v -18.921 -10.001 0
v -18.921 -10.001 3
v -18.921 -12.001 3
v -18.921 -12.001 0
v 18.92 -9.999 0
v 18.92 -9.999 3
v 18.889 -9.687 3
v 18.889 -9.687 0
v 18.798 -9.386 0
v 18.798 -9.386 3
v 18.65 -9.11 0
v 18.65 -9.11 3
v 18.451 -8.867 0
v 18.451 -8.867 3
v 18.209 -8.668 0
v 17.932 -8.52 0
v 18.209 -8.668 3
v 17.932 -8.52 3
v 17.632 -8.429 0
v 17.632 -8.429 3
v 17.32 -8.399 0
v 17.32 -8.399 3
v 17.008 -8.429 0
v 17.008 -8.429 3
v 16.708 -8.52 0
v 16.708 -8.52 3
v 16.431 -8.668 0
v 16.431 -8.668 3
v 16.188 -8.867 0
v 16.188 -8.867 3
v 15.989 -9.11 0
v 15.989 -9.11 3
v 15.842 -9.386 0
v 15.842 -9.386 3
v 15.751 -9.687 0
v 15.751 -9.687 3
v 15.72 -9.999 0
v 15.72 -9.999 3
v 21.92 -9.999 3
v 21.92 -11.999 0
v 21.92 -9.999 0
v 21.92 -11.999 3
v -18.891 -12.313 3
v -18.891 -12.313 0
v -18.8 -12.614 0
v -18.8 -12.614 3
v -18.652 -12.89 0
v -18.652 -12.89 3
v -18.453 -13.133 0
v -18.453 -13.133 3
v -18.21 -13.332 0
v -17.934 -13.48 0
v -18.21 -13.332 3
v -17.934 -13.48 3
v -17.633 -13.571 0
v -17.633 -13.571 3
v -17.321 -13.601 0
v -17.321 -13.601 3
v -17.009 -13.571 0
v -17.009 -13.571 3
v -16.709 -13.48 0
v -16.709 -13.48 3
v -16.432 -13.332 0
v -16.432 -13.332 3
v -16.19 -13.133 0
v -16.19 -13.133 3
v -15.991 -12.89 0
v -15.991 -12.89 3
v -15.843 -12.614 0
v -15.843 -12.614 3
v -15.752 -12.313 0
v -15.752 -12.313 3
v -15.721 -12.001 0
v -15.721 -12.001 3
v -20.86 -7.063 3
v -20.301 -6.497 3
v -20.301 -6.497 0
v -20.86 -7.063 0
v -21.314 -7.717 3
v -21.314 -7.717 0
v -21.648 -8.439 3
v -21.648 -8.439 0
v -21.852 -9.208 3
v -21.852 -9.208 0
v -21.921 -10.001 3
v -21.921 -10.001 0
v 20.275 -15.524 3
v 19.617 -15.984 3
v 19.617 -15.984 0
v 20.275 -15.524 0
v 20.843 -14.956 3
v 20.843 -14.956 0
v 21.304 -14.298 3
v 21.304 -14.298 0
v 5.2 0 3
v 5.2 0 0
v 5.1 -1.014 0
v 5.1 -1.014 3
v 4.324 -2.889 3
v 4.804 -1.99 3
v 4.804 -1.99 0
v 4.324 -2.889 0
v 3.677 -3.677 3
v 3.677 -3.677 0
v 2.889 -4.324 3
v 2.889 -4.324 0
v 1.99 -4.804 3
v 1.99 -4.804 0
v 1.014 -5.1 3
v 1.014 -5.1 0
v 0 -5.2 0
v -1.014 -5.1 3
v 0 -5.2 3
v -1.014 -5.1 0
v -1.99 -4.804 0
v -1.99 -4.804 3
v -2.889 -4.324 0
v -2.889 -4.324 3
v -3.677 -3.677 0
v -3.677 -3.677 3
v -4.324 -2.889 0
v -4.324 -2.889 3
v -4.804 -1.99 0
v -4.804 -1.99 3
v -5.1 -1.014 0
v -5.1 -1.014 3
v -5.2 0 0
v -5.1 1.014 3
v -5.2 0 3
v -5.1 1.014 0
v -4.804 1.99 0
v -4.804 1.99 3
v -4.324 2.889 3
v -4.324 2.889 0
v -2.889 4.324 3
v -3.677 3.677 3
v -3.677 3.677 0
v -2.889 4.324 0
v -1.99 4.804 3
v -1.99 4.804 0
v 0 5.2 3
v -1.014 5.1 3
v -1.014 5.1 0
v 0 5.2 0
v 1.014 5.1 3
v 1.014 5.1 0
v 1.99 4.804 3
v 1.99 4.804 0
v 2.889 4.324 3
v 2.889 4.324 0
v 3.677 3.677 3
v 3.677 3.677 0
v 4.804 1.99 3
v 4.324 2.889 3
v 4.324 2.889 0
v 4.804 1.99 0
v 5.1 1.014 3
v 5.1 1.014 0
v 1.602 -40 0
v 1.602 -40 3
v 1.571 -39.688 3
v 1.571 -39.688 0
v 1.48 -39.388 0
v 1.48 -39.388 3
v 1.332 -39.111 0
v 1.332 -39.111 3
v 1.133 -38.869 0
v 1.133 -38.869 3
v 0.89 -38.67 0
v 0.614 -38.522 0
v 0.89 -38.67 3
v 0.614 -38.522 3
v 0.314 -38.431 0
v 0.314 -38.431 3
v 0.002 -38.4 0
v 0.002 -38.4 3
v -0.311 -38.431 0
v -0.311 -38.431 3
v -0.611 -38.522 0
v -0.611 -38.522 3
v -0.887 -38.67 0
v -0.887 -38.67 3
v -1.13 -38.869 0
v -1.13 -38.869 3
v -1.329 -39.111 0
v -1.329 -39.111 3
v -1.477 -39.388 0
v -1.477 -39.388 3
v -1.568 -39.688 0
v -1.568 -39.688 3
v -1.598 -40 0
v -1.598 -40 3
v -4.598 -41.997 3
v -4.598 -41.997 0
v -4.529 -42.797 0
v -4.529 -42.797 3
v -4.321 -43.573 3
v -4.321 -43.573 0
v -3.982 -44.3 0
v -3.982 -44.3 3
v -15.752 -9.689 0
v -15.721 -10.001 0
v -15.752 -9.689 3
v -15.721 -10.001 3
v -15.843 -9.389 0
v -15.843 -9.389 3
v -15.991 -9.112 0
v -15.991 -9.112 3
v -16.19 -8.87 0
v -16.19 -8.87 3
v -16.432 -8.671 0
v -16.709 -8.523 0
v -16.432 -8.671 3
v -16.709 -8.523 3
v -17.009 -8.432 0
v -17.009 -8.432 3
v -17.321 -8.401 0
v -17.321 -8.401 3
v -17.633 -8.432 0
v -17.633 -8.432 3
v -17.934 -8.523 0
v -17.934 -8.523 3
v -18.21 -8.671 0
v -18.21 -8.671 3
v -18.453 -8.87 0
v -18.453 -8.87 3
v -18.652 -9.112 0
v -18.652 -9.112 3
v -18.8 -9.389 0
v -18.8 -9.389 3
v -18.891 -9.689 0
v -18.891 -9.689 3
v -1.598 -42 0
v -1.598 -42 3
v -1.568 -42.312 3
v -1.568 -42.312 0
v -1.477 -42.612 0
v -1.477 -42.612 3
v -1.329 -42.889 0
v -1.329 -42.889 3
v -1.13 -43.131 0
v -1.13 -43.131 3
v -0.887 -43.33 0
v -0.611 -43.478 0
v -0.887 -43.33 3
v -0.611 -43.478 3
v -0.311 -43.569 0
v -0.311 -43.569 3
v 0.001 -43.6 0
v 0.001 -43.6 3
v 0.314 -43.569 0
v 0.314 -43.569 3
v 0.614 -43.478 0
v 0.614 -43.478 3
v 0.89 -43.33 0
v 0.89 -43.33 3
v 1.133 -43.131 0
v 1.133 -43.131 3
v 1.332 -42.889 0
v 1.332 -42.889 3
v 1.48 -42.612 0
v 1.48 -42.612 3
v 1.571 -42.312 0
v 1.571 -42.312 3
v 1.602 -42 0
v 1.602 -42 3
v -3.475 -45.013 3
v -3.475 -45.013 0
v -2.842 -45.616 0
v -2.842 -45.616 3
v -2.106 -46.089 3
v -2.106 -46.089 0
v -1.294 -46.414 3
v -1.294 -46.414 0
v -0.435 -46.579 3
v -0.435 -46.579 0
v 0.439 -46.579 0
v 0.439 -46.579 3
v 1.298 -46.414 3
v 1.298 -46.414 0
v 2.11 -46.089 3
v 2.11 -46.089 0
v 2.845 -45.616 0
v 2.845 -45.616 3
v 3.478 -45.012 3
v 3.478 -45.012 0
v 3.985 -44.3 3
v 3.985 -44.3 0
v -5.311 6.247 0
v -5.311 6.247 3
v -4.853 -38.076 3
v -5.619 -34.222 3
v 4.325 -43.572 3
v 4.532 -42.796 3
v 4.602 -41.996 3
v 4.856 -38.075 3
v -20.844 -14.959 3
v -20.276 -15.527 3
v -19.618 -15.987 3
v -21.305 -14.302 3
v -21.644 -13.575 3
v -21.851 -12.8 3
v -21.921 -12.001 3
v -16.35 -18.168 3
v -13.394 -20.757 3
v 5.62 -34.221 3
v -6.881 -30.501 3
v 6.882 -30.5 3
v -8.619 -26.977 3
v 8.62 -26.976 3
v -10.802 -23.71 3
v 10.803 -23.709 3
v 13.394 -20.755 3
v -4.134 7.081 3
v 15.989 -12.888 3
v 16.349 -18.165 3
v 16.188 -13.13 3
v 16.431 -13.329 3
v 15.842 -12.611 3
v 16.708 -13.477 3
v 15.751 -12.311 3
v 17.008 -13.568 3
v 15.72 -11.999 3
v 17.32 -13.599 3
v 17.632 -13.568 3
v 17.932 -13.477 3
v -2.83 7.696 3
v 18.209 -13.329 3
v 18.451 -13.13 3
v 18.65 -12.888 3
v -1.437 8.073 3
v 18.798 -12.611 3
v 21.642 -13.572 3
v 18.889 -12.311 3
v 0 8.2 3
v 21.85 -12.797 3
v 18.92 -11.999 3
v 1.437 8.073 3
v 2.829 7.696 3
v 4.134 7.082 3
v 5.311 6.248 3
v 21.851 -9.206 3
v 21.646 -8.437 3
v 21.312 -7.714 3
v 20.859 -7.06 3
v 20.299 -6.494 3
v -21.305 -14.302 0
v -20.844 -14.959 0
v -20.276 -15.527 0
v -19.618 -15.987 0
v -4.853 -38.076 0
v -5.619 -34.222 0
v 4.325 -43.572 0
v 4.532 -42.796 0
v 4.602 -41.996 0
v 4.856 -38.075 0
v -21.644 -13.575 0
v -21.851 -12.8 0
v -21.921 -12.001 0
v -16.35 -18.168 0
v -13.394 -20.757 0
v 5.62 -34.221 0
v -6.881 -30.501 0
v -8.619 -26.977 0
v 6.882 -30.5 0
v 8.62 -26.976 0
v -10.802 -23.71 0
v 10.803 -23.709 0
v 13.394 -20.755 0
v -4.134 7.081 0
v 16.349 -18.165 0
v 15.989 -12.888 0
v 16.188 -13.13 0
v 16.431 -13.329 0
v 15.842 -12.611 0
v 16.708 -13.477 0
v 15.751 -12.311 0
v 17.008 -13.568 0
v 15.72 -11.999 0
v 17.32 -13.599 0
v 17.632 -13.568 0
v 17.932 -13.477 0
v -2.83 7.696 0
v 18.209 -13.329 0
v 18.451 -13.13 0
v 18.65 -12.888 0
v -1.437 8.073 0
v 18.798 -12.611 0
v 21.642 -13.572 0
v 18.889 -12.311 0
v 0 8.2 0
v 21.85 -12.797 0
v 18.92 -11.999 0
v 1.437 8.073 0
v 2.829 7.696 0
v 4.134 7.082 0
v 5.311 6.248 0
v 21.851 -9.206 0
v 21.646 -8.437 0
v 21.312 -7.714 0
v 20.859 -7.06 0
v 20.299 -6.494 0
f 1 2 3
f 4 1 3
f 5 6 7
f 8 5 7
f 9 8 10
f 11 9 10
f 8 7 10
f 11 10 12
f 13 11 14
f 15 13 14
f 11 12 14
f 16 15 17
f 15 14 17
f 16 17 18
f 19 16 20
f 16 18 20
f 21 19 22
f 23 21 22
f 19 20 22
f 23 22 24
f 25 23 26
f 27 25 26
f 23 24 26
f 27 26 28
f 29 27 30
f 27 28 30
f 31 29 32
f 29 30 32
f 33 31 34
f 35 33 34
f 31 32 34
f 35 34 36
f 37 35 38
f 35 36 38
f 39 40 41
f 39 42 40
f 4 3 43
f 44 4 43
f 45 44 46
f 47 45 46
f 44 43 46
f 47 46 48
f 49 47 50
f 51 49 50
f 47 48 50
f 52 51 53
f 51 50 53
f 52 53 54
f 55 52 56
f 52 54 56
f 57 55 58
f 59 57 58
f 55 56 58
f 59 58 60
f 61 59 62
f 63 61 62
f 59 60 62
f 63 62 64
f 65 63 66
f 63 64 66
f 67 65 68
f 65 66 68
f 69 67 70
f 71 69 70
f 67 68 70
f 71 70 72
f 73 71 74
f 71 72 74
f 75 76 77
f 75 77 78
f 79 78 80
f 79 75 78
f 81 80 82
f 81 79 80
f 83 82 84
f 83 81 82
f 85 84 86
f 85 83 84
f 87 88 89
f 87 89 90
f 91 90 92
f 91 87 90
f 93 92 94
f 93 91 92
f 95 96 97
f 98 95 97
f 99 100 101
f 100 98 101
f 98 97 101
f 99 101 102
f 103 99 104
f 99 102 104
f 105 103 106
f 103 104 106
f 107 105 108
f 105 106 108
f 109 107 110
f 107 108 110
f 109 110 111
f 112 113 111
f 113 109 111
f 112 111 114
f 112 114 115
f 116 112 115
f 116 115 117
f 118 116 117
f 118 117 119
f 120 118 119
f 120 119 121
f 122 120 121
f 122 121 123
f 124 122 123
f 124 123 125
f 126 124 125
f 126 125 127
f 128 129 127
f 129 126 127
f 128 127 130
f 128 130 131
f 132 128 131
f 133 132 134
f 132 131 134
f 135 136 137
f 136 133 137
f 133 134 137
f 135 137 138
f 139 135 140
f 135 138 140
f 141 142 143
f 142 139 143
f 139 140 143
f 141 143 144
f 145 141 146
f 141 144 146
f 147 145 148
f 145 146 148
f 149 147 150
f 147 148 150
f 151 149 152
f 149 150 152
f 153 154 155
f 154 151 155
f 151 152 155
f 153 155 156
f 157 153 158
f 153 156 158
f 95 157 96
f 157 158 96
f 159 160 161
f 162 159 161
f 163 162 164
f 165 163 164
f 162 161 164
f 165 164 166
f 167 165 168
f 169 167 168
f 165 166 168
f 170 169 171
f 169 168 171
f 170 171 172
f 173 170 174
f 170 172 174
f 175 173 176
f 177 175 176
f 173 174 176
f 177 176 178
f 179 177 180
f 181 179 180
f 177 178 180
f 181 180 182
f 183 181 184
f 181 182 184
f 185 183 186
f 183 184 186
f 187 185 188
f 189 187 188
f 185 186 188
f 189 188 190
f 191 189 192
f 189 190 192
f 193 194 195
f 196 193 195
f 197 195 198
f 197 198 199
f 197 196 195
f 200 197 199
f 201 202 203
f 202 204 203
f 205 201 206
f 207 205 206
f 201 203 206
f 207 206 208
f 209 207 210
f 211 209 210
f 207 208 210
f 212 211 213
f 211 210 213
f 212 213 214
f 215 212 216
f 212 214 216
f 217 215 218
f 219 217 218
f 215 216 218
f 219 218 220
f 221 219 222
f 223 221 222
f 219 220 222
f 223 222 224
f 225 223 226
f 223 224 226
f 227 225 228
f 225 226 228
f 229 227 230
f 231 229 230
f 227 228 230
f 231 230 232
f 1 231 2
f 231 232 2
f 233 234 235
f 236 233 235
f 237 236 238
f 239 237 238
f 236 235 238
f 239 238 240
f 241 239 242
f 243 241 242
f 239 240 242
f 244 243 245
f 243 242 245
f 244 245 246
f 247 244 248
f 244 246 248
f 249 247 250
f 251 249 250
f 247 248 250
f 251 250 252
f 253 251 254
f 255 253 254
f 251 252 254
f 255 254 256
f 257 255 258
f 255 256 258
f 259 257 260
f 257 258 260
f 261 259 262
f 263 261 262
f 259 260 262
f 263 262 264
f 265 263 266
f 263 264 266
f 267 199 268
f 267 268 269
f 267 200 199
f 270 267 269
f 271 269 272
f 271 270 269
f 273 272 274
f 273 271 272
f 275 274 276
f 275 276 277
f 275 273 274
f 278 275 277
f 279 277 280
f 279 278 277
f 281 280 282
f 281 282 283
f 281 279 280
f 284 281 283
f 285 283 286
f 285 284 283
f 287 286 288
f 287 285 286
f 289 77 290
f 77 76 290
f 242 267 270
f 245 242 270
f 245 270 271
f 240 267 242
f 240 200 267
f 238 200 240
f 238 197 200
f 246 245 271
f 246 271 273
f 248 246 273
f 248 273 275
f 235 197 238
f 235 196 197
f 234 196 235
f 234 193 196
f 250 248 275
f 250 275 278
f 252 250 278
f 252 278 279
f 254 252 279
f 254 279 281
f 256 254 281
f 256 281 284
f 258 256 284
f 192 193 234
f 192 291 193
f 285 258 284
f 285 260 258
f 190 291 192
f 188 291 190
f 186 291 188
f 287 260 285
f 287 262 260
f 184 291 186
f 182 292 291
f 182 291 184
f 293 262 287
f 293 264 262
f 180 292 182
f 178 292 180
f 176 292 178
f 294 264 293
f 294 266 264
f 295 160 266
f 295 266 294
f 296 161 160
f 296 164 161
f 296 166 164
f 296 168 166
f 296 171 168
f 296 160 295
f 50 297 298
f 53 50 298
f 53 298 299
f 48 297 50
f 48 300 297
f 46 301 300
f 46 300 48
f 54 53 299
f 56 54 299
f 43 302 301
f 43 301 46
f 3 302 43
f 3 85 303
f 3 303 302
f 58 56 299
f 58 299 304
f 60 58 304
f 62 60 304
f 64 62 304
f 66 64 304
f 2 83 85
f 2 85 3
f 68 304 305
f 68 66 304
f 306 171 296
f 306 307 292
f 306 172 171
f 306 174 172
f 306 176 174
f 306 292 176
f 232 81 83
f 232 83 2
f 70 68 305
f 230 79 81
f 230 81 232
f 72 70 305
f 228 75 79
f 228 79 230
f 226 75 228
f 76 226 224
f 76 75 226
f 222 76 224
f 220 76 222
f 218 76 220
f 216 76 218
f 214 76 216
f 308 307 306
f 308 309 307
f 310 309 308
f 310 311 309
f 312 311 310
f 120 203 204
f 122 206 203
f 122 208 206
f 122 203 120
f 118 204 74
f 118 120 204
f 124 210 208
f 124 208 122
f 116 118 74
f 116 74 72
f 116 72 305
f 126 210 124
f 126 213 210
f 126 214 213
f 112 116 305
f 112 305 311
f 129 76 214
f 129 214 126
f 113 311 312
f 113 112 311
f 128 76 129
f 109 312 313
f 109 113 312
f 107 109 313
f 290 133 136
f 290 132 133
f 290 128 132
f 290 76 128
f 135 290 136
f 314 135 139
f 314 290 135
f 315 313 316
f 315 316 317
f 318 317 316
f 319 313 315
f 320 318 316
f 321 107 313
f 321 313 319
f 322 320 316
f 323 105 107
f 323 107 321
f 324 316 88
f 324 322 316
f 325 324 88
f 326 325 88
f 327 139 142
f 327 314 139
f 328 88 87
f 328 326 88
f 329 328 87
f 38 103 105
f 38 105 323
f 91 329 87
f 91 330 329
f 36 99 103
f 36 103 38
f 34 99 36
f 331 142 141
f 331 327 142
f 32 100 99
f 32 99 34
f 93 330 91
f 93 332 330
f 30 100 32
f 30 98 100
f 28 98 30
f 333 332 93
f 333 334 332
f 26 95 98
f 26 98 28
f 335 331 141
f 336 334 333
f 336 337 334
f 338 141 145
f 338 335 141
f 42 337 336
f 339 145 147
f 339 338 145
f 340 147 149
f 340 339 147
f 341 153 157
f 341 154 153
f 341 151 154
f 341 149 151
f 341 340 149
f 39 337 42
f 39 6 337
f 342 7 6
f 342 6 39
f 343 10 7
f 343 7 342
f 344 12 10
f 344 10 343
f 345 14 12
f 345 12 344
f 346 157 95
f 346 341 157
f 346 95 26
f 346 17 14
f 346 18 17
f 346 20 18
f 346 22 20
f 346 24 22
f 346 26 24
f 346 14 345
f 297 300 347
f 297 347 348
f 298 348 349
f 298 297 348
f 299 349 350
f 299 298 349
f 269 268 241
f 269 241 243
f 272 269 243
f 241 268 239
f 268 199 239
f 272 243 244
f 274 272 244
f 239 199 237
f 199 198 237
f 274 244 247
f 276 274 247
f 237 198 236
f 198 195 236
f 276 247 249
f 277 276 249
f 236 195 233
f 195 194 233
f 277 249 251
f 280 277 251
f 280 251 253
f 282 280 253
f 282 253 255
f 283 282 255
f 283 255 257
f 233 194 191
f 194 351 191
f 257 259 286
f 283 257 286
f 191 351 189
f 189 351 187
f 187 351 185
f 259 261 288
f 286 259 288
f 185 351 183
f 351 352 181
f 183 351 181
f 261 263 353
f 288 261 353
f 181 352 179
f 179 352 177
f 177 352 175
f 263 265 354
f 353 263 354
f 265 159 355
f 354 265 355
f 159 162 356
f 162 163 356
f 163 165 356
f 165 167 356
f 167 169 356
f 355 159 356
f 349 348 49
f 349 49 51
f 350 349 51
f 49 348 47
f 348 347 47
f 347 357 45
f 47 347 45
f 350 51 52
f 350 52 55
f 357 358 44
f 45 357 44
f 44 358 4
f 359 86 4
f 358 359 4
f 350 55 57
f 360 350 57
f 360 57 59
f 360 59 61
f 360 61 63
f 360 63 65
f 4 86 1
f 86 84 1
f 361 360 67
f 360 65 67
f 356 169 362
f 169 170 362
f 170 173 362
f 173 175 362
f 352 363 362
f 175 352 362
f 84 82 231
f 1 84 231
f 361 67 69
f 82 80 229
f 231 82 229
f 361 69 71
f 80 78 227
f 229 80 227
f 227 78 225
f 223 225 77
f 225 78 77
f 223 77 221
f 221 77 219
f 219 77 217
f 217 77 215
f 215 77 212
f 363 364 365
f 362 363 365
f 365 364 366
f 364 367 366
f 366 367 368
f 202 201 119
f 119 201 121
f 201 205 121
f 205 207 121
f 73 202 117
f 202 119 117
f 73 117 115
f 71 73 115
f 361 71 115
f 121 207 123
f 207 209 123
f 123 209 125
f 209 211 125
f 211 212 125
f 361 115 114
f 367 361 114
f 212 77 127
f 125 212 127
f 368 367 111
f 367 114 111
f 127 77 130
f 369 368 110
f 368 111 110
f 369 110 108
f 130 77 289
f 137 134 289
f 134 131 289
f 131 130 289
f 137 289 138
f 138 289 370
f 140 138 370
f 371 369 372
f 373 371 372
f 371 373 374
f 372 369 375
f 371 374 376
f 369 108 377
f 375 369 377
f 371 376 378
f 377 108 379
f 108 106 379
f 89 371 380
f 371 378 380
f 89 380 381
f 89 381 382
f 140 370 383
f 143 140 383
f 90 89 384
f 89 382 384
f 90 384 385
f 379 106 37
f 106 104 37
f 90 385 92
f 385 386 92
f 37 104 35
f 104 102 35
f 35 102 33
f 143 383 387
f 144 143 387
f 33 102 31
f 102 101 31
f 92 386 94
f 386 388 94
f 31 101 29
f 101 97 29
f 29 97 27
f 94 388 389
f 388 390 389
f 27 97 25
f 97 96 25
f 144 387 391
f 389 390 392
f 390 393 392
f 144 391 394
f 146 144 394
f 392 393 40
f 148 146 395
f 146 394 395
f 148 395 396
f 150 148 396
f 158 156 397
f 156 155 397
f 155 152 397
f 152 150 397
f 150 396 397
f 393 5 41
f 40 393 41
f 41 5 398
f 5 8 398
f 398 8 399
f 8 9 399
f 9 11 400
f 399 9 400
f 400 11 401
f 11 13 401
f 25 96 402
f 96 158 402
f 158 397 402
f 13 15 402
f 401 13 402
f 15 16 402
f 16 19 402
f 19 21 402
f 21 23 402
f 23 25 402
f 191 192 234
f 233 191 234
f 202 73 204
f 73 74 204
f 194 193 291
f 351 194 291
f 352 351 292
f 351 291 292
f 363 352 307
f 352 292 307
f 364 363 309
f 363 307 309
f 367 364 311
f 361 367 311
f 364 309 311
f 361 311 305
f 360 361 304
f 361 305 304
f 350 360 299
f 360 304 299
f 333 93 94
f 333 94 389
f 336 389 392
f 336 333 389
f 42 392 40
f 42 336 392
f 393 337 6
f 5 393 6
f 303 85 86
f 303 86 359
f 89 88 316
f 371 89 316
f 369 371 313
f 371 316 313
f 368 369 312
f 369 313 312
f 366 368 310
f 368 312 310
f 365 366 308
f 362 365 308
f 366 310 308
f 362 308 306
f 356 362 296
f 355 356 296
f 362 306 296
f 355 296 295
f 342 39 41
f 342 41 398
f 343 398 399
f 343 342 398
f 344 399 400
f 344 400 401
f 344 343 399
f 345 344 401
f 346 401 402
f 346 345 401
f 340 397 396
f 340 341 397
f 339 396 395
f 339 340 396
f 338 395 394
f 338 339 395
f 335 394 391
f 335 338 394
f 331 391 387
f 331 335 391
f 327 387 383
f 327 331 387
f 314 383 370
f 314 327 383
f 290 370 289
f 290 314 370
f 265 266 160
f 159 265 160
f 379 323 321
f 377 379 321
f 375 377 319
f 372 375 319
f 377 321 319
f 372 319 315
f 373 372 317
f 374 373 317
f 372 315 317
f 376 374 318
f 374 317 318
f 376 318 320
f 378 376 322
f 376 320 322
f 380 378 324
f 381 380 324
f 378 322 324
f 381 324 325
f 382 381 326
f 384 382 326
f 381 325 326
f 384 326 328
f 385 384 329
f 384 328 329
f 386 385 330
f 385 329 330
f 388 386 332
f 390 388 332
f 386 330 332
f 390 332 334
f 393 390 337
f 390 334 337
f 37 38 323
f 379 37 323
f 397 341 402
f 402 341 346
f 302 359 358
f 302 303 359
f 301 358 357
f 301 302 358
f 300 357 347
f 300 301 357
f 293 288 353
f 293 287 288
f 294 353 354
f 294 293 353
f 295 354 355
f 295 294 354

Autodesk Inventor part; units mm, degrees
ref_plane "YZ Plane" through (0, 0, 0) normal (1, 0, 0) x (0, 1, 0)
ref_plane "XZ Plane" through (0, 0, 0) normal (0, 1, 0) x (-1, 0, 0)
ref_plane "XY Plane" through (0, 0, 0) normal (0, 0, 1) x (1, 0, 0)
sketch "スケッチ1" plane through (0, 0, 0) normal (0, 0, 1) x (1, 0, 0)
  circle A0 centre (0, 0) radius 5.2
  line L0 (25, -50) -> (-25, -50)
  line L1 (-25, -50) -> (-25, 50)
  line L2 (-25, 50) -> (25, 50)
  line L3 (25, 50) -> (25, -50)
  line L4 (25, -50) -> (-25, 50) construction
  line L5 (-25, -50) -> (25, 50) construction
  dimension "d0" = 10.4
  dimension "d1" = 50
  dimension "d2" = 100
extrude "押し出し1" add sketch "スケッチ1" along normal blind 3
sketch "スケッチ2" plane through (0, 0, 3) normal (0, 0, 1) x (1, 0, 0)
  circle A0 centre (17.3198, -9.9987) radius 1.25 construction
  circle A1 centre (-17.3213, -10.0013) radius 1.25 construction
  circle A2 centre (0.0015, -40) radius 1.25 construction
  line L0 (-17.3213, -10.0013) -> (-17.3213, -12.0013) construction
  line L1 (-18.9213, -10.0013) -> (-18.9213, -12.0013)
  line L2 (-15.7213, -12.0013) -> (-15.7213, -10.0013)
  arc A3 (-15.7213, -10.0013) -> (-18.9213, -10.0013) centre (-17.3213, -10.0013) ccw
  arc A4 (-18.9213, -12.0013) -> (-15.7213, -12.0013) centre (-17.3213, -12.0013) ccw
  line L3 (0.0015, -40) -> (0.0015, -42) construction
  line L4 (-1.5985, -40) -> (-1.5985, -42)
  line L5 (1.6015, -42) -> (1.6015, -40)
  arc A5 (1.6015, -40) -> (-1.5985, -40) centre (0.0015, -40) ccw
  arc A6 (-1.5985, -42) -> (1.6015, -42) centre (0.0015, -42) ccw
  line L6 (17.3198, -9.9987) -> (17.3198, -11.9987) construction
  line L7 (15.7198, -9.9987) -> (15.7198, -11.9987)
  line L8 (18.9198, -11.9987) -> (18.9198, -9.9987)
  arc A7 (18.9198, -9.9987) -> (15.7198, -9.9987) centre (17.3198, -9.9987) ccw
  arc A8 (15.7198, -11.9987) -> (18.9198, -11.9987) centre (17.3198, -11.9987) ccw
  circle A9 centre (0, 0) radius 5.2 projected
  arc A10 (5.3111, 6.2476) -> (-5.3114, 6.2473) centre (0, 0) ccw
  line L9 (-12.7213, -12.0013) -> (-12.7213, -10.0013)
  arc A11 (-20.3008, -6.4967) -> (-21.9213, -10.0013) centre (-17.3213, -10.0013) ccw
  line L10 (-21.9213, -10.0013) -> (-21.9213, -12.0013)
  arc A12 (-21.9213, -12.0013) -> (-21.3048, -14.3016) centre (-17.3213, -12.0013) ccw
  line L11 (21.9198, -11.9987) -> (21.9198, -9.9987)
  arc A13 (21.9198, -9.9987) -> (20.2992, -6.494) centre (17.3198, -9.9987) ccw
  line L12 (12.7198, -9.9987) -> (12.7198, -11.9987)
  arc A14 (21.3037, -14.2984) -> (21.9198, -11.9987) centre (17.3198, -11.9987) ccw
  line L13 (4.6015, -40) -> (4.6015, -42)
  arc A15 (-3.9821, -44.3003) -> (3.9854, -44.2997) centre (0.0015, -42) ccw
  line L14 (-4.5985, -42) -> (-4.5985, -40)
  arc A16 (4.6015, -40) -> (-4.5985, -40) centre (0.0015, -40) ccw
  line L15 (-20.3008, -6.4967) -> (-5.3114, 6.2473)
  line L16 (5.3111, 6.2476) -> (20.2992, -6.494)
  line L17 (21.3037, -14.2984) -> (3.9854, -44.2997)
  line L18 (-3.9821, -44.3003) -> (-21.3048, -14.3016)
  point P0 (-17.3213, -11.0013)
  point P1 (0.0015, -41)
  point P2 (17.3198, -10.9987)
  dimension "d5" = 1.6
  dimension "d6" = 2
  dimension "d7" = 3
  dimension "d8" = 3
  dimension "d9" = 3
  dimension "d10" = 3
extrude "押し出し2" cut sketch "スケッチ2" against normal blind 3 keep common part
sketch "スケッチ3" plane through (0, 0, 3) normal (0, 0, 1) x (1, 0, 0)
  arc A0 (15.7198, -11.9987) -> (18.9198, -11.9987) centre (17.3198, -11.9987) ccw projected
  line L0 (15.7198, -9.9987) -> (15.7198, -11.9987) projected
  arc A1 (18.9198, -9.9987) -> (15.7198, -9.9987) centre (17.3198, -9.9987) ccw projected
  line L1 (18.9198, -11.9987) -> (18.9198, -9.9987) projected
  arc A2 (-1.5985, -42) -> (1.6015, -42) centre (0.0015, -42) ccw projected
  line L2 (-1.5985, -40) -> (-1.5985, -42) projected
  arc A3 (1.6015, -40) -> (-1.5985, -40) centre (0.0015, -40) ccw projected
  line L3 (1.6015, -42) -> (1.6015, -40) projected
  arc A4 (-18.9213, -12.0013) -> (-15.7213, -12.0013) centre (-17.3213, -12.0013) ccw projected
  line L4 (-18.9213, -10.0013) -> (-18.9213, -12.0013) projected
  arc A5 (-15.7213, -10.0013) -> (-18.9213, -10.0013) centre (-17.3213, -10.0013) ccw projected
  line L5 (-15.7213, -12.0013) -> (-15.7213, -10.0013) projected
  line L6 (-21.9213, -12.0013) -> (-21.9213, -10.0013) projected
  arc A6 (-21.9213, -12.0013) -> (-21.3048, -14.3016) centre (-17.3213, -12.0013) ccw projected
  line L7 (-3.9821, -44.3003) -> (-21.3048, -14.3016) projected
  arc A7 (-3.9821, -44.3003) -> (3.9854, -44.2997) centre (0.0015, -42) ccw projected
  line L8 (21.3037, -14.2984) -> (3.9854, -44.2997) projected
  arc A8 (21.3037, -14.2984) -> (21.9198, -11.9987) centre (17.3198, -11.9987) ccw projected
  line L9 (21.9198, -9.9987) -> (21.9198, -11.9987) projected
  arc A9 (21.9198, -9.9987) -> (20.2992, -6.494) centre (17.3198, -9.9987) ccw projected
  line L10 (5.3111, 6.2476) -> (20.2992, -6.494) projected
  arc A10 (5.3111, 6.2476) -> (-5.3114, 6.2473) centre (0, 0) ccw projected
  line L11 (-20.3008, -6.4967) -> (-5.3114, 6.2473) projected
  arc A11 (-20.3008, -6.4967) -> (-21.9213, -10.0013) centre (-17.3213, -10.0013) ccw projected
  circle A12 centre (0, 0) radius 5.2 projected
  arc A13 (19.6173, -15.9838) -> (4.6015, -41.9965) centre (34.6015, -41.9737) ccw
  arc A14 (19.6173, -15.9838) -> (21.3037, -14.2984) centre (17.3198, -11.9987) ccw
  arc A15 (-21.3048, -14.3016) -> (-19.6182, -15.9868) centre (-17.3213, -12.0013) ccw
  arc A16 (-4.5985, -41.9972) -> (-19.6182, -15.9868) centre (-34.5985, -41.9789) ccw
  arc A17 (-4.5985, -41.9972) -> (-3.9821, -44.3003) centre (0.0015, -42) ccw
  arc A18 (3.9854, -44.2997) -> (4.6015, -41.9965) centre (0.0015, -42) ccw
  arc A19 (-21.9213, -12.0013) -> (-21.3048, -14.3016) centre (-17.3213, -12.0013) ccw projected
  dimension "d14" = 30
extrude "押し出し3" cut sketch "スケッチ3" against normal through all contours L6 A11 L11 A10 L10 A9 L9 A8 A14 A13 A18 A7 A17 A16 A15 A6 keep common part
properties part number "POTplate" material "アルミニウム 2014-T4"
